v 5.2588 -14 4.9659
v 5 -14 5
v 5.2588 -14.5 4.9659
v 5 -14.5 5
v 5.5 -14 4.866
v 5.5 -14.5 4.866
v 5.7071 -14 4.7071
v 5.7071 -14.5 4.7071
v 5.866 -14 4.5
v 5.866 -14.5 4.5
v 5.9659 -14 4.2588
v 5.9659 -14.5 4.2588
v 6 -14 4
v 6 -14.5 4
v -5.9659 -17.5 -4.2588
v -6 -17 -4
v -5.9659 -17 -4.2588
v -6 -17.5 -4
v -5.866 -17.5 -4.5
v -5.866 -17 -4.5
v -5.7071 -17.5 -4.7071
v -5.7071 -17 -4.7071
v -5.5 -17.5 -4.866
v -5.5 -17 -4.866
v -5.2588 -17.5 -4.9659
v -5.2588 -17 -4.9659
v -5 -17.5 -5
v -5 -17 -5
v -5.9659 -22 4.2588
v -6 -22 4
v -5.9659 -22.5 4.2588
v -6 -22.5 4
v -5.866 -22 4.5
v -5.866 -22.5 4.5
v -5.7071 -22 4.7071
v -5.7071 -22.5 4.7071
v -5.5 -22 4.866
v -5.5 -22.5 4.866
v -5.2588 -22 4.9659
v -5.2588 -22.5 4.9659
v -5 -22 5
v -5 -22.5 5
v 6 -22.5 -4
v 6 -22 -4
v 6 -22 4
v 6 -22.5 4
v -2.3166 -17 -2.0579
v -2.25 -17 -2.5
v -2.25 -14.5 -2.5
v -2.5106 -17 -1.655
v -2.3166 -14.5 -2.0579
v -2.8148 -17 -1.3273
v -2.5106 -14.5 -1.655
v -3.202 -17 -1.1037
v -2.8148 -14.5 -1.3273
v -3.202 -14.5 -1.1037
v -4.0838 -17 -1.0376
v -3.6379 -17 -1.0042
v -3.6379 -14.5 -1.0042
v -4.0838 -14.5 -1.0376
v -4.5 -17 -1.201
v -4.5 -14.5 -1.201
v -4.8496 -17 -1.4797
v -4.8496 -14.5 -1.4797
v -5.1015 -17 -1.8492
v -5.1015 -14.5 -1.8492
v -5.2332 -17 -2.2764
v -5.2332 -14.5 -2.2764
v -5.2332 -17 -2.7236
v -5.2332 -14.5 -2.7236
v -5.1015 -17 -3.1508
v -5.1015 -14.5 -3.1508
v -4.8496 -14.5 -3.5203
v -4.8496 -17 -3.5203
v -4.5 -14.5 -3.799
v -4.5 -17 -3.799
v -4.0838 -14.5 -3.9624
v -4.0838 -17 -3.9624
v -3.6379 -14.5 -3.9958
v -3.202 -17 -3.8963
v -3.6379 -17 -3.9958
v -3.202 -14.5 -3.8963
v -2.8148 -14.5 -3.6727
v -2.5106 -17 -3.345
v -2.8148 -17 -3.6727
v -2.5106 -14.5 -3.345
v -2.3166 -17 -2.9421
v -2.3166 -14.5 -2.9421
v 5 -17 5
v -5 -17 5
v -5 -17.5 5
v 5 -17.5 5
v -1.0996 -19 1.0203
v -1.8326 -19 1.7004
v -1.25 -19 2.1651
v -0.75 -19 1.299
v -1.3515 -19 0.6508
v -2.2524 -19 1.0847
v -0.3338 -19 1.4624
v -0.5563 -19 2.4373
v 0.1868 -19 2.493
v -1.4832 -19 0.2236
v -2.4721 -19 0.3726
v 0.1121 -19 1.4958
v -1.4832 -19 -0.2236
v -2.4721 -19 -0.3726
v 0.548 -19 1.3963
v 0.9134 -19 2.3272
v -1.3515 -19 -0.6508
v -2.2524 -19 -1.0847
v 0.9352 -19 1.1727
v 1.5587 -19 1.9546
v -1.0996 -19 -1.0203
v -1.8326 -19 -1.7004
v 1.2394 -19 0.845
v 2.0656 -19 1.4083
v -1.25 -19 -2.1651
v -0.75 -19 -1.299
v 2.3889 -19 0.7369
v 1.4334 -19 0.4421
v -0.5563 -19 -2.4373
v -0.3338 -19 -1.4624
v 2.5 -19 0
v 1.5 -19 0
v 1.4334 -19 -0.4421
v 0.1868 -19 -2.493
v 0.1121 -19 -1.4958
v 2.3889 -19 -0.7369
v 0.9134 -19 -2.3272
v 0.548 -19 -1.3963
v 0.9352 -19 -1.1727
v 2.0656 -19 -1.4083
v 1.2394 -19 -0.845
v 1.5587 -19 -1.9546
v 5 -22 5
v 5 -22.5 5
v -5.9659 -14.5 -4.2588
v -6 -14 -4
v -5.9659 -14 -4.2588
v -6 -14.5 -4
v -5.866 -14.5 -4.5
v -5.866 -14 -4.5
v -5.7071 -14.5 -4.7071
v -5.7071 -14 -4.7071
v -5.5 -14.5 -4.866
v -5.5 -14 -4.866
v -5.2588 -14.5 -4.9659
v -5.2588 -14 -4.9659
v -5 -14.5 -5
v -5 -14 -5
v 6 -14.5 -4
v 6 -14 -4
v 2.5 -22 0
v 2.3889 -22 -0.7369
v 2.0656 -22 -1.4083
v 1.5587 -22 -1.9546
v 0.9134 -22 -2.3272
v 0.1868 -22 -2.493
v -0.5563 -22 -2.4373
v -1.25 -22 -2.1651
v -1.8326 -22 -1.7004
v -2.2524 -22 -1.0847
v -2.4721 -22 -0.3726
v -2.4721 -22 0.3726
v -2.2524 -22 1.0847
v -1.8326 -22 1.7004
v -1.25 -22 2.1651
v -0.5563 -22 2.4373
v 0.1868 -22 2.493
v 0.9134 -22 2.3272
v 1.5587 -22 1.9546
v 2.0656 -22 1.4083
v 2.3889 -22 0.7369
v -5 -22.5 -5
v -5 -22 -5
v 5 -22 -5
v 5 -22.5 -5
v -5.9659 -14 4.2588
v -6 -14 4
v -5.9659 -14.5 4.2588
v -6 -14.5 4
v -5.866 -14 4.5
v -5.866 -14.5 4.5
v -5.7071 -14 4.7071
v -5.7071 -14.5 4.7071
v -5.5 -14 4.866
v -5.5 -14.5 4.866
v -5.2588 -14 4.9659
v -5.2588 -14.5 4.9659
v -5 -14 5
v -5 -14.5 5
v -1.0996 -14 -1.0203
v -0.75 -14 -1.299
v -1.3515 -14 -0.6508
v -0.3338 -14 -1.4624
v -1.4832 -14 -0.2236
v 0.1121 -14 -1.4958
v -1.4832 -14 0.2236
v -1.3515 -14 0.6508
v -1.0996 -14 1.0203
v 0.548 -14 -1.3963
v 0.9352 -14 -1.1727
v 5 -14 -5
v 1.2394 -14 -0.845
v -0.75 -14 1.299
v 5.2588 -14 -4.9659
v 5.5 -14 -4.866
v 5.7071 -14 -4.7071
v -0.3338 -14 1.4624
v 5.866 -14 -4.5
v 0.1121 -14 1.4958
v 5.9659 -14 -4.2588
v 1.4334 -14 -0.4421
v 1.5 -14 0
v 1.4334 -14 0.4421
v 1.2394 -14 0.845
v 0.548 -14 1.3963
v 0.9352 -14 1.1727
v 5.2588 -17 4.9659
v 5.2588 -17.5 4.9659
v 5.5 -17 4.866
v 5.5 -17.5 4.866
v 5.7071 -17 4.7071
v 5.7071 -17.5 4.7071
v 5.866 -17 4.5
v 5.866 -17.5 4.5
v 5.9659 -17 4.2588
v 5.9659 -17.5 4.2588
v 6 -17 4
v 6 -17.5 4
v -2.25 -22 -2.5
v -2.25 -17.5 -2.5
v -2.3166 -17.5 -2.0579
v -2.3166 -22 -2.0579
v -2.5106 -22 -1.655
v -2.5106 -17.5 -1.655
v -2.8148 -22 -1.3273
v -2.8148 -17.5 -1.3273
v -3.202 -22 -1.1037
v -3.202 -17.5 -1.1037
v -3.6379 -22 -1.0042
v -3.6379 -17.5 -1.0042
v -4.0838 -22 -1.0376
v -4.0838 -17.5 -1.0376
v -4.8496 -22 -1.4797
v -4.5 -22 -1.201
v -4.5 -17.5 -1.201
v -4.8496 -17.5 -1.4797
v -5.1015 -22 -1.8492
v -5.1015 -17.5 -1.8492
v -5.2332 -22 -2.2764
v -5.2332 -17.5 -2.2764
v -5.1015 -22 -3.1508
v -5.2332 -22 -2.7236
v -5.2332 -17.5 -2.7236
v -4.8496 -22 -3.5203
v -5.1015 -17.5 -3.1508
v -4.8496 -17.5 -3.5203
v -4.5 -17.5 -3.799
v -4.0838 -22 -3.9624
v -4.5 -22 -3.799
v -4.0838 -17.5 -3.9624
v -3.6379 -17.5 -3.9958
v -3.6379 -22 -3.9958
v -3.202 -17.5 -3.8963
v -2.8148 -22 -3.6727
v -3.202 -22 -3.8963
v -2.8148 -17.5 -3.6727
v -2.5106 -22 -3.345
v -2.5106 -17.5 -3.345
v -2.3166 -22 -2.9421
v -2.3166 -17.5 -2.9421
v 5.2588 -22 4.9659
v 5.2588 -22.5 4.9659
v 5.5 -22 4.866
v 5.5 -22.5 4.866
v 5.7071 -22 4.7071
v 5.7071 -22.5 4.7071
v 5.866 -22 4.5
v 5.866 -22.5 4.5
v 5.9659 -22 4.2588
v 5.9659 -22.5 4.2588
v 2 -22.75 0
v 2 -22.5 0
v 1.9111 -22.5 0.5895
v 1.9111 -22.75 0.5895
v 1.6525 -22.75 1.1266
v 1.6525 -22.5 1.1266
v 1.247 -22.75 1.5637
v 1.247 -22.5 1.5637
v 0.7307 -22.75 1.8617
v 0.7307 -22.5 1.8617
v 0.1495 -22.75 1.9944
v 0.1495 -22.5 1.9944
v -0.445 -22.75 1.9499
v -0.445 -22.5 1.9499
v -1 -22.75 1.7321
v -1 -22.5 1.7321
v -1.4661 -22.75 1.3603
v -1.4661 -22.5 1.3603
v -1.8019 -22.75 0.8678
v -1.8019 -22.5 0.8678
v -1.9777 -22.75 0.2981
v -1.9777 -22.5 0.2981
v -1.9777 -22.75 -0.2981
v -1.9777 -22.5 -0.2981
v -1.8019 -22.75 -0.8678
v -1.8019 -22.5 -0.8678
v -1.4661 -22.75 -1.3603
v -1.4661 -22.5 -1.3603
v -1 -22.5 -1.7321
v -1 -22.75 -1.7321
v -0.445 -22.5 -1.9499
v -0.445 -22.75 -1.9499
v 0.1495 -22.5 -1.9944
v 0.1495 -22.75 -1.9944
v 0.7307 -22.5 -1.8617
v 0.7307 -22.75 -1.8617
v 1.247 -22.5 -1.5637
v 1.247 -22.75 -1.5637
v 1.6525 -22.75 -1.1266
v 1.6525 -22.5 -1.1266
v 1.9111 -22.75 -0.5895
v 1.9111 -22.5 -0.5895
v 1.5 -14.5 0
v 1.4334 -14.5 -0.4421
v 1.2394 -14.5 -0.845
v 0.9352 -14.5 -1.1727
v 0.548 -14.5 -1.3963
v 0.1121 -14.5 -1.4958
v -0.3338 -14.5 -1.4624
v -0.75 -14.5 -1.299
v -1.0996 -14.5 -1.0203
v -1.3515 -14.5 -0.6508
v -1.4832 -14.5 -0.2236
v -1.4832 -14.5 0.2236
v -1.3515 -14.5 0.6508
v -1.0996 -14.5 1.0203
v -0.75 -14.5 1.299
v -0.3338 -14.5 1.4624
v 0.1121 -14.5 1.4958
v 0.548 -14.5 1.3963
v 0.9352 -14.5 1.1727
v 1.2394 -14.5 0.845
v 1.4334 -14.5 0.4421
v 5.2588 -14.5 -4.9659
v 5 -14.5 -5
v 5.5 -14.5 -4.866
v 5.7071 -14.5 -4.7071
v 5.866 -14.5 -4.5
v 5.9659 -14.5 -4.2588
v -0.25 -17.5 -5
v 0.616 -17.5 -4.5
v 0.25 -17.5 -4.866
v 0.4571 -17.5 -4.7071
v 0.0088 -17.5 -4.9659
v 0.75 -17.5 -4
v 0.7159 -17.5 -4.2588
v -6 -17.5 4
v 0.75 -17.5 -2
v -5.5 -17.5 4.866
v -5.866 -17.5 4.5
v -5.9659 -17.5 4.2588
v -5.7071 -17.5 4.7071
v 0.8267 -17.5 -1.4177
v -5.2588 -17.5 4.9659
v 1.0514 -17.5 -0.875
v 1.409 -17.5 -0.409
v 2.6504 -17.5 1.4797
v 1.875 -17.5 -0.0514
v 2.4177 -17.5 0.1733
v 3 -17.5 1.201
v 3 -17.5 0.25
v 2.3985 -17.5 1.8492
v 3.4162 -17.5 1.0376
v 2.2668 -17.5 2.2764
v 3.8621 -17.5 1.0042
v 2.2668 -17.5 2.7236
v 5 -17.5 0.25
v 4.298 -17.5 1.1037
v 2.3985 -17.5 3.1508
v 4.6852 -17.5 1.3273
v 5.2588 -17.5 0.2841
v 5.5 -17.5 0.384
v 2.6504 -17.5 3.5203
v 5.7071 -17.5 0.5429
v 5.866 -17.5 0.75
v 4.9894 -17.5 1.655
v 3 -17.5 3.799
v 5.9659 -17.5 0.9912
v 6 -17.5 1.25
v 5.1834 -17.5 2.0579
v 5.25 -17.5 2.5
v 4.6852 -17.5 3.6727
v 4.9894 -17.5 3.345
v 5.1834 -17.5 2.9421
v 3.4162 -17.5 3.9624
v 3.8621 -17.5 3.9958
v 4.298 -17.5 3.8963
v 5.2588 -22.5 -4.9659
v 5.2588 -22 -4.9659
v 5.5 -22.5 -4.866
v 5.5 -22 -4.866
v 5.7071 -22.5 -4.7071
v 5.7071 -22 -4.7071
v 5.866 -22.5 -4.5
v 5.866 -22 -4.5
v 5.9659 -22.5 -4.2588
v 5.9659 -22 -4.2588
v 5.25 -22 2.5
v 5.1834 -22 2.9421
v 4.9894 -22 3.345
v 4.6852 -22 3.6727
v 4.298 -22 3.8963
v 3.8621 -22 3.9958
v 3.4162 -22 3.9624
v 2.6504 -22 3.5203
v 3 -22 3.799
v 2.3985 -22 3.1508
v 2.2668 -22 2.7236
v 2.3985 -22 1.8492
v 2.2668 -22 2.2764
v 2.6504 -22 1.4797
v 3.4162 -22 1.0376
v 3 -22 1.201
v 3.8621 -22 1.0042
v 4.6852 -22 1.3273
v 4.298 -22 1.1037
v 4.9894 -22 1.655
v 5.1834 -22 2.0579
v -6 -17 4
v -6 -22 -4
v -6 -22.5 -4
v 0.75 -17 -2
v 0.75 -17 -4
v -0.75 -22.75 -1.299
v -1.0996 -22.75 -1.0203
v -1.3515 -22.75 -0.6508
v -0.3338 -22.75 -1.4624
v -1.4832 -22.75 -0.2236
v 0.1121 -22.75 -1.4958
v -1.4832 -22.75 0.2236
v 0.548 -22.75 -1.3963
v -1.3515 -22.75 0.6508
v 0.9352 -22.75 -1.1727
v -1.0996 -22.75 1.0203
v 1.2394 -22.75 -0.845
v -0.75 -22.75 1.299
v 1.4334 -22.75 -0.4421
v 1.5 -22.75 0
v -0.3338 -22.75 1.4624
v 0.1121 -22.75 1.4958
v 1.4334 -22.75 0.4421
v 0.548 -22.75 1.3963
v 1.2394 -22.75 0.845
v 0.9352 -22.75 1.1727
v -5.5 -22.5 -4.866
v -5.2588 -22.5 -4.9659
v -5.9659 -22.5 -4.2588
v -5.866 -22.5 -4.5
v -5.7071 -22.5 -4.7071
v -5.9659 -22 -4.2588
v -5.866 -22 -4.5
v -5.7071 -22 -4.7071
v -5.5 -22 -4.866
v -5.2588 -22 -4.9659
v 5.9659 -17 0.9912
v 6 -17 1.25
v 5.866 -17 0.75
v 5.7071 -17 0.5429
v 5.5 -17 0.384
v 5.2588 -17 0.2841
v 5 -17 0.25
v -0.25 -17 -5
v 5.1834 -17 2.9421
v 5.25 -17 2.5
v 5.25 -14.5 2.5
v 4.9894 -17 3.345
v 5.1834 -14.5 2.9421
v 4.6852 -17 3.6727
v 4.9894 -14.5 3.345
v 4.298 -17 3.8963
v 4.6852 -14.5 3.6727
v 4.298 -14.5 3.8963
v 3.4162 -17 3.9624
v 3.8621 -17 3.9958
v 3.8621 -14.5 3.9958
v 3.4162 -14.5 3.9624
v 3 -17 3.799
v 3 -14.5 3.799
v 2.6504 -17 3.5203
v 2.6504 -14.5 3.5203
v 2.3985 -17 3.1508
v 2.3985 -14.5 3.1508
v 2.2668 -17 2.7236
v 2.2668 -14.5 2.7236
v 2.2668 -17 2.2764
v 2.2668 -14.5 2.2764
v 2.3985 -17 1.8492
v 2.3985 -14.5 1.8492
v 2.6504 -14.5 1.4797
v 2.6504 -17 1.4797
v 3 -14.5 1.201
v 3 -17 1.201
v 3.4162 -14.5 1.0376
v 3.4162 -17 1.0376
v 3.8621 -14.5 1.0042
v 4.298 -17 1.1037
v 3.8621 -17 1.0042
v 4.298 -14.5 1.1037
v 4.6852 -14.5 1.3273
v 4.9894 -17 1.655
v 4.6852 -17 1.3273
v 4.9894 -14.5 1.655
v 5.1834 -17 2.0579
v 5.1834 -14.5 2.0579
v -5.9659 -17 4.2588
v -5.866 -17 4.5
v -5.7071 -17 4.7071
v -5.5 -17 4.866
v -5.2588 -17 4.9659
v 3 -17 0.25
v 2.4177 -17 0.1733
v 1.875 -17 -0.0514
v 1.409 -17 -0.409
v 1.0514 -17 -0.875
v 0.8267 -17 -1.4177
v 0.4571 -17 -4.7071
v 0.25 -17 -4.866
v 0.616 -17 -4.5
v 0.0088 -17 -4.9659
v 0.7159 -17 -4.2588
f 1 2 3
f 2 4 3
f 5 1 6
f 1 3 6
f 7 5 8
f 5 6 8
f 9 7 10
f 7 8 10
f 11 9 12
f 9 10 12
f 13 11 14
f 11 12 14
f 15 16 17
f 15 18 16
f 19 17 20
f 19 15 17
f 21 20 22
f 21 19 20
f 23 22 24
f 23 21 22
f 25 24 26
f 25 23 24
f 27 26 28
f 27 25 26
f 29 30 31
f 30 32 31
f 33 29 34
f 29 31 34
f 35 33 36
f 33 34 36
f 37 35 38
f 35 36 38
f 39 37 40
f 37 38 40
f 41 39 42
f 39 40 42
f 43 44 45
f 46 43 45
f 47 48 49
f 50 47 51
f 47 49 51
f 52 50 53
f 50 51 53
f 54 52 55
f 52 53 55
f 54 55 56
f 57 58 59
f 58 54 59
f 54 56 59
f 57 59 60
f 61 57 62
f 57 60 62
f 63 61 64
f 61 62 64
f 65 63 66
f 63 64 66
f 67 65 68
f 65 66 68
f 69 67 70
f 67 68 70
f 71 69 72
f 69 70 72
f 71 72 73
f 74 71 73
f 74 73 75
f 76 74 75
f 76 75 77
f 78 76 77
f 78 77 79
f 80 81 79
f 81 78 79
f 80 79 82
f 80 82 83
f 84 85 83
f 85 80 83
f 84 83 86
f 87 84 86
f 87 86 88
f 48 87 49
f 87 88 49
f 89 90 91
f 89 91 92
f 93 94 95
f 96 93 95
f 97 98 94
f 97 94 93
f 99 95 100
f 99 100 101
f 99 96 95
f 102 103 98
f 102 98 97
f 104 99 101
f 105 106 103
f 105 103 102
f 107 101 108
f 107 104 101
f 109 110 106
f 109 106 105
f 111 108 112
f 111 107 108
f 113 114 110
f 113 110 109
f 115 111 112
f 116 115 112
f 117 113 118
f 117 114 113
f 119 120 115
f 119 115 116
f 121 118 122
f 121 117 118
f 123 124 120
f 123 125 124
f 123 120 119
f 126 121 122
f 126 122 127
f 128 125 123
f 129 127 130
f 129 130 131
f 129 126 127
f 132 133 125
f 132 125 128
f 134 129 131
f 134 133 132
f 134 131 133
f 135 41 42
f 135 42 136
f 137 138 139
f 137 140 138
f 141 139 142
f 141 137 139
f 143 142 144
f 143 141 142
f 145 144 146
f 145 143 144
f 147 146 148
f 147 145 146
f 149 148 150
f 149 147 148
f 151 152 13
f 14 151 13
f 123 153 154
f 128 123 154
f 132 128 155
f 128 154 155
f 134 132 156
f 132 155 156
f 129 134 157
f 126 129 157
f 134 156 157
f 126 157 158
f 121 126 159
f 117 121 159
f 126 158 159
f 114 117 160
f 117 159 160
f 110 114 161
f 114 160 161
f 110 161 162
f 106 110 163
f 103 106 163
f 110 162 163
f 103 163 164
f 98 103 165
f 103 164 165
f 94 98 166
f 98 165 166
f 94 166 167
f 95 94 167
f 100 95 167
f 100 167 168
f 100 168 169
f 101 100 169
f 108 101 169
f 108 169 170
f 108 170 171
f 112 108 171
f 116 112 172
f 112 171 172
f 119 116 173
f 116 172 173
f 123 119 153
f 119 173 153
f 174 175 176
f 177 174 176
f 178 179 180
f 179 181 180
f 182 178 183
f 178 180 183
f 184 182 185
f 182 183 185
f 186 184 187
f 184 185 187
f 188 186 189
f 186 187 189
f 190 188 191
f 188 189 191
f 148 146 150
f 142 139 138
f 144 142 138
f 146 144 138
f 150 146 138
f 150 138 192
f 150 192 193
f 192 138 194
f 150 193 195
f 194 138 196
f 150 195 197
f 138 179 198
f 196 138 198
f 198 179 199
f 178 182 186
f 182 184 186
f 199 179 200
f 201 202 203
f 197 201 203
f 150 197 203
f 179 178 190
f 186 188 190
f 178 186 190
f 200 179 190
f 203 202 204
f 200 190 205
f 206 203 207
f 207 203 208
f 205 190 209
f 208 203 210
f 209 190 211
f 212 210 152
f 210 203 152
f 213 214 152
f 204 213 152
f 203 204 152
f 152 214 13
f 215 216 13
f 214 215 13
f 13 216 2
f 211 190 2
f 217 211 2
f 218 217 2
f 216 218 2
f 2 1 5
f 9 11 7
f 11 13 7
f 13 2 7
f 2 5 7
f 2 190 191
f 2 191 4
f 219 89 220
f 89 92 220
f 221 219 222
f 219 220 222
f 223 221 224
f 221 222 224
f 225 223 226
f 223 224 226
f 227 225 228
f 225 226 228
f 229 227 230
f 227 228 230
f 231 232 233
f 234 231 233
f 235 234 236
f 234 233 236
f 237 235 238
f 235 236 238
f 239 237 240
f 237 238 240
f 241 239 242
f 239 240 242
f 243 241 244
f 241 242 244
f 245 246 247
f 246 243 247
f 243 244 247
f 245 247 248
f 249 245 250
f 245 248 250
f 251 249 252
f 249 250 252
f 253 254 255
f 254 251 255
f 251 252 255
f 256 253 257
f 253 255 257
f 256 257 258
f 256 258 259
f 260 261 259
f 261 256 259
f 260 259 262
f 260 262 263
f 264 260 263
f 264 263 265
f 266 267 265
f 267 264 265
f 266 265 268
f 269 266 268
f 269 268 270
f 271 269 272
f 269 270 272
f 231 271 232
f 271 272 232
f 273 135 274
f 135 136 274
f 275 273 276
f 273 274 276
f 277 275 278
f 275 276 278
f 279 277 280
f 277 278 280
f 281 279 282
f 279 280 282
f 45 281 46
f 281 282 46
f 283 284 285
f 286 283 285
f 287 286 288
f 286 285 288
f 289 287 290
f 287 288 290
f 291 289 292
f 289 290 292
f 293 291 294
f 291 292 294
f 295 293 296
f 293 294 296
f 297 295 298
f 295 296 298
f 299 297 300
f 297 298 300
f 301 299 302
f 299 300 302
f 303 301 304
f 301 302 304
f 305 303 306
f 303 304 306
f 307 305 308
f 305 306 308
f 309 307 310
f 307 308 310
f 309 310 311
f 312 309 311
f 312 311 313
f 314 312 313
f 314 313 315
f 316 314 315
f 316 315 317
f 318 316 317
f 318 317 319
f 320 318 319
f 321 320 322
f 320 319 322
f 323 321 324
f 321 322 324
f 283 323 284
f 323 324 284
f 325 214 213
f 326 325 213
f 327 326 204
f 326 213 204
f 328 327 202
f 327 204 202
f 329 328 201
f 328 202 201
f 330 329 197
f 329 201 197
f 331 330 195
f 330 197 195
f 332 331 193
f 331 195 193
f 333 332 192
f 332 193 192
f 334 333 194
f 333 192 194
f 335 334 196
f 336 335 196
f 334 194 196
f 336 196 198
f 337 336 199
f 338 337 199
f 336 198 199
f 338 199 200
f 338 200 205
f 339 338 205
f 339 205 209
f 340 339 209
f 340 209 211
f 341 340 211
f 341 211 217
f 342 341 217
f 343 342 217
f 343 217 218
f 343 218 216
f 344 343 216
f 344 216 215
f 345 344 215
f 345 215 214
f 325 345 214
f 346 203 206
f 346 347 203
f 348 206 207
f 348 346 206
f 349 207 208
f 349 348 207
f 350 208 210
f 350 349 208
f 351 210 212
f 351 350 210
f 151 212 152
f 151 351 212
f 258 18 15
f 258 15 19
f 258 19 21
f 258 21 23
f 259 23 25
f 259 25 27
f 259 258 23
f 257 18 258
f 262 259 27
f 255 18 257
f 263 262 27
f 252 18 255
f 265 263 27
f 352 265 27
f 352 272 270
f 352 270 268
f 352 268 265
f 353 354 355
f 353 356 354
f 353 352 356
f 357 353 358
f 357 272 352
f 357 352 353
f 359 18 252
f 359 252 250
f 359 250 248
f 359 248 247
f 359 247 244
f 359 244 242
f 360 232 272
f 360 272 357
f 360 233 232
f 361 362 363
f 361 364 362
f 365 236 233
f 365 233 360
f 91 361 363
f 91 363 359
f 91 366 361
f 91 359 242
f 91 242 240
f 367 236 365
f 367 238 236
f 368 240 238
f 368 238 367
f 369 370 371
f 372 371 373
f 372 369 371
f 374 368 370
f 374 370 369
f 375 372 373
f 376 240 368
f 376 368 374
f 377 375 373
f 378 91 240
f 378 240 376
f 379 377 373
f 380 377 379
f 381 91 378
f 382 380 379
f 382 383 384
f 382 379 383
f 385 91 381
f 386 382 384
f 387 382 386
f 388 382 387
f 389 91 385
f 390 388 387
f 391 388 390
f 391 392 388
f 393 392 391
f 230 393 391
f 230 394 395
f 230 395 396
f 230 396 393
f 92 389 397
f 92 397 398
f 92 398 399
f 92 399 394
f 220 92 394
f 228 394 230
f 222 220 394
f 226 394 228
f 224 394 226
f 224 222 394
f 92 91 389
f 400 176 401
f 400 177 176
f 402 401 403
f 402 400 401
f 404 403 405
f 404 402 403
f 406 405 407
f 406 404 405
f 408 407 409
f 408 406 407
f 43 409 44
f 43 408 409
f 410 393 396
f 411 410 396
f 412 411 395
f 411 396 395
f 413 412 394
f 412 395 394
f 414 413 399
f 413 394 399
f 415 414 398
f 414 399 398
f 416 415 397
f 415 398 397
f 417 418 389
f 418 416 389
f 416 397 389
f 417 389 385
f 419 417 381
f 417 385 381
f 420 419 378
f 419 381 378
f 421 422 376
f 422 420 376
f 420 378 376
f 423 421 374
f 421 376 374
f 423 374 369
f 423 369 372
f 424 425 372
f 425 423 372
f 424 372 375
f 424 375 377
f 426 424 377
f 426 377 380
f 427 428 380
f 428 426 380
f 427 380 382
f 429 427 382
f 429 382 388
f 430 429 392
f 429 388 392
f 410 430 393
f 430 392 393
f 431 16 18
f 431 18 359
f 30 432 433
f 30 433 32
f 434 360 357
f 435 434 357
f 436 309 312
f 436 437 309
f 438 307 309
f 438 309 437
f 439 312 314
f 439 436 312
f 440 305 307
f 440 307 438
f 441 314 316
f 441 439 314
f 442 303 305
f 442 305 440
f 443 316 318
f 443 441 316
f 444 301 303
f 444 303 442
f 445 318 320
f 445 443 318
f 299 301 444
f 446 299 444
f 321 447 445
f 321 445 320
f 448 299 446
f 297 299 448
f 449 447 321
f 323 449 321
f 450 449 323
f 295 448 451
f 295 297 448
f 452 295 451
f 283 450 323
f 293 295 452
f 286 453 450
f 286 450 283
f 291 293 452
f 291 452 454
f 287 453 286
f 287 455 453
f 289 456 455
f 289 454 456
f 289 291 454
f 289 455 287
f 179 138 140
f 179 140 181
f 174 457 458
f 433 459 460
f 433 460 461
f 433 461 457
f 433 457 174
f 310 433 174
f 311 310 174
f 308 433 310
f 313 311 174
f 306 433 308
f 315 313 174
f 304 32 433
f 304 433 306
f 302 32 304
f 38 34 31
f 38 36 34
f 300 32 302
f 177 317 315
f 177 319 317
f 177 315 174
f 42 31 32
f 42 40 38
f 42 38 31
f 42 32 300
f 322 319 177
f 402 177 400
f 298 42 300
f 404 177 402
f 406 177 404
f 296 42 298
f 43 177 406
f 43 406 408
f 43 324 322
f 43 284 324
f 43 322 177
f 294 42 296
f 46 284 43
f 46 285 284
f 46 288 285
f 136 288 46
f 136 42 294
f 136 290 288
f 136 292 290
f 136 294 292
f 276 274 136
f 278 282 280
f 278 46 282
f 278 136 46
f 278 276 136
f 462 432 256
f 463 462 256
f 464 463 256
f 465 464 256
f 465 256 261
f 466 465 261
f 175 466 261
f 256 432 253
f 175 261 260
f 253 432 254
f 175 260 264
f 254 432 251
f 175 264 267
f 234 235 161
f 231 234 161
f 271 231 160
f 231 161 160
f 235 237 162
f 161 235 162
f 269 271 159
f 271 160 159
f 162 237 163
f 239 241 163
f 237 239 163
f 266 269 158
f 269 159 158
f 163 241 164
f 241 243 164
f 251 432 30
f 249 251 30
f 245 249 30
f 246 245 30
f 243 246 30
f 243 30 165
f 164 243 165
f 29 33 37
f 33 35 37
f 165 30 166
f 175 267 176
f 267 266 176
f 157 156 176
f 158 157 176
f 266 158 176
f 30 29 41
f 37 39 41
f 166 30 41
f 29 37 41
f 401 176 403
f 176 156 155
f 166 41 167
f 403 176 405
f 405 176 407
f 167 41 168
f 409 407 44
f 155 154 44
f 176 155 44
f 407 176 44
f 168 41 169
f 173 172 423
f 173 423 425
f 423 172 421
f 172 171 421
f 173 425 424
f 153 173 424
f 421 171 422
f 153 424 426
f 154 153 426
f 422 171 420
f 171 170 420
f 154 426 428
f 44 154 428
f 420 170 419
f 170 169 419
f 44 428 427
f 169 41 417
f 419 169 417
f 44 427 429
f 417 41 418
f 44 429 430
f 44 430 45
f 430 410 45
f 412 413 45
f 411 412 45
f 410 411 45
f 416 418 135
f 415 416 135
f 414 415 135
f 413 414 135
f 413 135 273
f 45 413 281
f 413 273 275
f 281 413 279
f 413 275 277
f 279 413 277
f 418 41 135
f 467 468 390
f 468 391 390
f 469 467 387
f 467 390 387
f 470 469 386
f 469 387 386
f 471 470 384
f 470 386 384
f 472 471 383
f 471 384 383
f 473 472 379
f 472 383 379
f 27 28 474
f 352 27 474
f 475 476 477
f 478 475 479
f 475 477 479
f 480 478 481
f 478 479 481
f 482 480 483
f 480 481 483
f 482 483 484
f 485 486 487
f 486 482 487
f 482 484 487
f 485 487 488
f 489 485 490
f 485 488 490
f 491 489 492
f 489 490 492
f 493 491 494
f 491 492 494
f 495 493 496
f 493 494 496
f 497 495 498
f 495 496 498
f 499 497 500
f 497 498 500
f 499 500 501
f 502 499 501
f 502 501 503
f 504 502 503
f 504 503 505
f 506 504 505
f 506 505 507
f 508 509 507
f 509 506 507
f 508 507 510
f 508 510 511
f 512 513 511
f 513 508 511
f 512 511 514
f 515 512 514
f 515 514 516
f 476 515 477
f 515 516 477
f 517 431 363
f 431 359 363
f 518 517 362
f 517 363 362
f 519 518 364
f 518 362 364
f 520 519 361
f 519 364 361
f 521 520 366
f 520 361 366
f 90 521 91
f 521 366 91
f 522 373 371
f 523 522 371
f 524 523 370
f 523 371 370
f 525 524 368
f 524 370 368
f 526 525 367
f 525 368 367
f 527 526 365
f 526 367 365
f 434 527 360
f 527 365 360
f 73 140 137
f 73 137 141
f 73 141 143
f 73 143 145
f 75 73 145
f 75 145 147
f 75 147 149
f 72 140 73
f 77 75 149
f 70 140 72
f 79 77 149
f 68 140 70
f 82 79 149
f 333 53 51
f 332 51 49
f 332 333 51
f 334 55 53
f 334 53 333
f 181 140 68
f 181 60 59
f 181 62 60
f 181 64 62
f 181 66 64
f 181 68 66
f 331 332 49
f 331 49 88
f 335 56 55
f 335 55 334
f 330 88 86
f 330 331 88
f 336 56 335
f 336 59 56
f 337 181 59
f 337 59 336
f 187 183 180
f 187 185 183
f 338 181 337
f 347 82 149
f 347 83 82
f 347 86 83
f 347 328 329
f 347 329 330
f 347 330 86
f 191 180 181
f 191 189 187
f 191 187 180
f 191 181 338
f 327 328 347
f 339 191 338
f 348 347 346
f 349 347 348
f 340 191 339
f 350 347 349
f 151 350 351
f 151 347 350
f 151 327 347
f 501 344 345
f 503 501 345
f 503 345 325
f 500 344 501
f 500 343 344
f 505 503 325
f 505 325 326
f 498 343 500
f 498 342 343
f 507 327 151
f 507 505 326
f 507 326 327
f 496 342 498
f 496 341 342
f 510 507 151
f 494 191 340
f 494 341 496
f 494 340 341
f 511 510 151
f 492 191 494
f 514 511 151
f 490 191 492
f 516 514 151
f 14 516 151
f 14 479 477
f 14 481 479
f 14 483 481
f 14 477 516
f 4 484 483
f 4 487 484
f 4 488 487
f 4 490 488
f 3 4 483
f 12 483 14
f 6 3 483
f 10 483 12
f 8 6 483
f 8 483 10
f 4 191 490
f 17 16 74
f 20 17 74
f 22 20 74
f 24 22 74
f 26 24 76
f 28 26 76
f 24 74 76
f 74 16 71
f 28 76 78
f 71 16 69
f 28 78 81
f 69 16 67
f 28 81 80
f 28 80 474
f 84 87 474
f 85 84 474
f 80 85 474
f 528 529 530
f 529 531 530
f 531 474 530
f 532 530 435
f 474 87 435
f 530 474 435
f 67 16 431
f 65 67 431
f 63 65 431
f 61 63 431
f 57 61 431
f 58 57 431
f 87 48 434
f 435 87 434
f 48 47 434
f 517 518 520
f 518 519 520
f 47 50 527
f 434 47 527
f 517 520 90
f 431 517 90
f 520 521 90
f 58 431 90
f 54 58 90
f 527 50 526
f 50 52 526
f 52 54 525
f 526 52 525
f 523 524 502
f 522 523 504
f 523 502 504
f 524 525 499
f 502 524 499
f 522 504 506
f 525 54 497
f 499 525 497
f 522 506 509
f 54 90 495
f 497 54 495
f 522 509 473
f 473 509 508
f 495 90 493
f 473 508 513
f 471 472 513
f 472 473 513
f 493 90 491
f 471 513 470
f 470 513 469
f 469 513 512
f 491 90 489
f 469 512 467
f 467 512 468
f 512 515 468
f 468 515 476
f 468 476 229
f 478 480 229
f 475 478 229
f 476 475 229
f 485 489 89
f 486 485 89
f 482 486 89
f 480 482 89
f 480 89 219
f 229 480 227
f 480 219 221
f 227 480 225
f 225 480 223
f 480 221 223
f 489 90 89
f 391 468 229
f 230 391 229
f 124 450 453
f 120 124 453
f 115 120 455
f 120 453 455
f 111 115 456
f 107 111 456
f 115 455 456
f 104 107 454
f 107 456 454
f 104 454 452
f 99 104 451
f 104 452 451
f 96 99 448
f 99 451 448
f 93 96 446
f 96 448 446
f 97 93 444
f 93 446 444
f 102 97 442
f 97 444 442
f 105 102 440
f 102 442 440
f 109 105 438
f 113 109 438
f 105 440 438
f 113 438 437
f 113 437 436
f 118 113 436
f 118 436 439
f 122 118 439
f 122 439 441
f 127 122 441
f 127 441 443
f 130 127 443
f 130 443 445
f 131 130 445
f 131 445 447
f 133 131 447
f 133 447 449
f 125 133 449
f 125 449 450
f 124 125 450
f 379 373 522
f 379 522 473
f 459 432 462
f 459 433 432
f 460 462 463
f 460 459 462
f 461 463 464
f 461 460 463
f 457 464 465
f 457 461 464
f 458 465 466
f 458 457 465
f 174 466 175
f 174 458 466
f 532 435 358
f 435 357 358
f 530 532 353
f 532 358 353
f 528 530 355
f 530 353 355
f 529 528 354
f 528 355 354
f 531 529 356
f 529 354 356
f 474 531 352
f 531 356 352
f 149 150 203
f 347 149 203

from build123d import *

# Parameters (mm, degrees)
SKETCH006_W     = 12
SKETCH006_H     = 10
PAD003_DEPTH    = 0.5
SKETCH007_R     = 1.5
PAD004_DEPTH    = 7.7
SKETCH008_W     = 12
SKETCH008_H     = 10
PAD005_DEPTH    = 0.5
SKETCH009_W     = 12
SKETCH009_H     = 10
PAD006_DEPTH    = 0.5
SKETCH010_R     = 2
PAD007_DEPTH    = 0.25
SKETCH011_R     = 2.5
PAD008_DEPTH    = 3
SKETCH012_R     = 1.5
POCKET003_DEPTH = 5
POCKET004_DEPTH = 1
FILLET_R        = 1
SKETCH014_R     = 1.5
POCKET005_DEPTH = 2


with BuildPart() as part:
    # Sketch006 (on DatumPlane) → Pad003 (new body)
    with BuildSketch(Plane.XZ.offset(14)):
        Rectangle(SKETCH006_W, SKETCH006_H)
    extrude(amount=PAD003_DEPTH)

    # Sketch007 (on Face6 of Pad003) → Pad004 (join)
    with BuildSketch(Plane.XZ.offset(14.5)):
        with Locations((3.75, 2.5)):
            Circle(SKETCH007_R)
        with Locations((-3.75, -2.5)):
            Circle(SKETCH007_R)
    extrude(amount=PAD004_DEPTH)

    # Sketch008 (on DatumPlane) → Pad005 (join)
    with BuildSketch(Plane.XZ.offset(17)):
        Rectangle(SKETCH008_W, SKETCH008_H)
    extrude(amount=PAD005_DEPTH)

    # Sketch009 (on DatumPlane) → Pad006 (join)
    with BuildSketch(Plane.XZ.offset(22)):
        Rectangle(SKETCH009_W, SKETCH009_H)
    extrude(amount=PAD006_DEPTH)

    # Sketch010 (on Face22 of Pad006) → Pad007 (join)
    with BuildSketch(Plane.XZ.offset(22.5)):
        Circle(SKETCH010_R)
    extrude(amount=PAD007_DEPTH)

    # Sketch011 (on Face17 of Pad007) → Pad008 (join)
    with BuildSketch(Plane(origin=(0, -22, 0), x_dir=(1, 0, 0), z_dir=(0, 1, 0))):
        Circle(SKETCH011_R)
    extrude(amount=PAD008_DEPTH)

    # Sketch012 (on Face26 of Pad008) → Pocket003 (cut)
    with BuildSketch(Plane.XZ.offset(22.75)):
        Circle(SKETCH012_R)
    extrude(amount=-POCKET003_DEPTH, mode=Mode.SUBTRACT)

    # Sketch013 (on Face14 of Pocket003) → Pocket004 (cut)
    with BuildSketch(Plane.XZ.offset(17.5)):
        with BuildLine():
            Line((7.000018, 0.25), (7.000018, -6))
            Line((7.000018, -6), (0.75, -6))
            Line((0.75, -2), (0.75, -6))
            ThreePointArc((3.000018, 0.25), (1.409016, -0.409003), (0.75, -2))
            Line((3.000018, 0.25), (7.000018, 0.25))
        make_face()
    extrude(amount=-POCKET004_DEPTH, mode=Mode.SUBTRACT)

    # Fillet
    fillet_edges = [part.edges().sort_by_distance(p)[0] for p in [
        (6, -22.25, 5),
        (6, -17.25, 5),
        (6, -14.25, 5),
        (-6, -22.25, 5),
        (-6, -17.25, 5),
        (-6, -14.25, 5),
        (-6, -22.25, -5),
        (-6, -17.25, -5),
        (-6, -14.25, -5),
        (6, -22.25, -5),
        (6, -14.25, -5),
        (6, -17.25, 0.25),
        (0.75, -17.25, -5),
    ]]
    fillet(fillet_edges, radius=FILLET_R)

    # Sketch014 (on Face2 of Fillet) → Pocket005 (cut)
    with BuildSketch(Plane(origin=(0, -14, 0), x_dir=(1, 0, 0), z_dir=(0, 1, 0))):
        Circle(SKETCH014_R)
    extrude(amount=-POCKET005_DEPTH, mode=Mode.SUBTRACT)


solid = part.part
